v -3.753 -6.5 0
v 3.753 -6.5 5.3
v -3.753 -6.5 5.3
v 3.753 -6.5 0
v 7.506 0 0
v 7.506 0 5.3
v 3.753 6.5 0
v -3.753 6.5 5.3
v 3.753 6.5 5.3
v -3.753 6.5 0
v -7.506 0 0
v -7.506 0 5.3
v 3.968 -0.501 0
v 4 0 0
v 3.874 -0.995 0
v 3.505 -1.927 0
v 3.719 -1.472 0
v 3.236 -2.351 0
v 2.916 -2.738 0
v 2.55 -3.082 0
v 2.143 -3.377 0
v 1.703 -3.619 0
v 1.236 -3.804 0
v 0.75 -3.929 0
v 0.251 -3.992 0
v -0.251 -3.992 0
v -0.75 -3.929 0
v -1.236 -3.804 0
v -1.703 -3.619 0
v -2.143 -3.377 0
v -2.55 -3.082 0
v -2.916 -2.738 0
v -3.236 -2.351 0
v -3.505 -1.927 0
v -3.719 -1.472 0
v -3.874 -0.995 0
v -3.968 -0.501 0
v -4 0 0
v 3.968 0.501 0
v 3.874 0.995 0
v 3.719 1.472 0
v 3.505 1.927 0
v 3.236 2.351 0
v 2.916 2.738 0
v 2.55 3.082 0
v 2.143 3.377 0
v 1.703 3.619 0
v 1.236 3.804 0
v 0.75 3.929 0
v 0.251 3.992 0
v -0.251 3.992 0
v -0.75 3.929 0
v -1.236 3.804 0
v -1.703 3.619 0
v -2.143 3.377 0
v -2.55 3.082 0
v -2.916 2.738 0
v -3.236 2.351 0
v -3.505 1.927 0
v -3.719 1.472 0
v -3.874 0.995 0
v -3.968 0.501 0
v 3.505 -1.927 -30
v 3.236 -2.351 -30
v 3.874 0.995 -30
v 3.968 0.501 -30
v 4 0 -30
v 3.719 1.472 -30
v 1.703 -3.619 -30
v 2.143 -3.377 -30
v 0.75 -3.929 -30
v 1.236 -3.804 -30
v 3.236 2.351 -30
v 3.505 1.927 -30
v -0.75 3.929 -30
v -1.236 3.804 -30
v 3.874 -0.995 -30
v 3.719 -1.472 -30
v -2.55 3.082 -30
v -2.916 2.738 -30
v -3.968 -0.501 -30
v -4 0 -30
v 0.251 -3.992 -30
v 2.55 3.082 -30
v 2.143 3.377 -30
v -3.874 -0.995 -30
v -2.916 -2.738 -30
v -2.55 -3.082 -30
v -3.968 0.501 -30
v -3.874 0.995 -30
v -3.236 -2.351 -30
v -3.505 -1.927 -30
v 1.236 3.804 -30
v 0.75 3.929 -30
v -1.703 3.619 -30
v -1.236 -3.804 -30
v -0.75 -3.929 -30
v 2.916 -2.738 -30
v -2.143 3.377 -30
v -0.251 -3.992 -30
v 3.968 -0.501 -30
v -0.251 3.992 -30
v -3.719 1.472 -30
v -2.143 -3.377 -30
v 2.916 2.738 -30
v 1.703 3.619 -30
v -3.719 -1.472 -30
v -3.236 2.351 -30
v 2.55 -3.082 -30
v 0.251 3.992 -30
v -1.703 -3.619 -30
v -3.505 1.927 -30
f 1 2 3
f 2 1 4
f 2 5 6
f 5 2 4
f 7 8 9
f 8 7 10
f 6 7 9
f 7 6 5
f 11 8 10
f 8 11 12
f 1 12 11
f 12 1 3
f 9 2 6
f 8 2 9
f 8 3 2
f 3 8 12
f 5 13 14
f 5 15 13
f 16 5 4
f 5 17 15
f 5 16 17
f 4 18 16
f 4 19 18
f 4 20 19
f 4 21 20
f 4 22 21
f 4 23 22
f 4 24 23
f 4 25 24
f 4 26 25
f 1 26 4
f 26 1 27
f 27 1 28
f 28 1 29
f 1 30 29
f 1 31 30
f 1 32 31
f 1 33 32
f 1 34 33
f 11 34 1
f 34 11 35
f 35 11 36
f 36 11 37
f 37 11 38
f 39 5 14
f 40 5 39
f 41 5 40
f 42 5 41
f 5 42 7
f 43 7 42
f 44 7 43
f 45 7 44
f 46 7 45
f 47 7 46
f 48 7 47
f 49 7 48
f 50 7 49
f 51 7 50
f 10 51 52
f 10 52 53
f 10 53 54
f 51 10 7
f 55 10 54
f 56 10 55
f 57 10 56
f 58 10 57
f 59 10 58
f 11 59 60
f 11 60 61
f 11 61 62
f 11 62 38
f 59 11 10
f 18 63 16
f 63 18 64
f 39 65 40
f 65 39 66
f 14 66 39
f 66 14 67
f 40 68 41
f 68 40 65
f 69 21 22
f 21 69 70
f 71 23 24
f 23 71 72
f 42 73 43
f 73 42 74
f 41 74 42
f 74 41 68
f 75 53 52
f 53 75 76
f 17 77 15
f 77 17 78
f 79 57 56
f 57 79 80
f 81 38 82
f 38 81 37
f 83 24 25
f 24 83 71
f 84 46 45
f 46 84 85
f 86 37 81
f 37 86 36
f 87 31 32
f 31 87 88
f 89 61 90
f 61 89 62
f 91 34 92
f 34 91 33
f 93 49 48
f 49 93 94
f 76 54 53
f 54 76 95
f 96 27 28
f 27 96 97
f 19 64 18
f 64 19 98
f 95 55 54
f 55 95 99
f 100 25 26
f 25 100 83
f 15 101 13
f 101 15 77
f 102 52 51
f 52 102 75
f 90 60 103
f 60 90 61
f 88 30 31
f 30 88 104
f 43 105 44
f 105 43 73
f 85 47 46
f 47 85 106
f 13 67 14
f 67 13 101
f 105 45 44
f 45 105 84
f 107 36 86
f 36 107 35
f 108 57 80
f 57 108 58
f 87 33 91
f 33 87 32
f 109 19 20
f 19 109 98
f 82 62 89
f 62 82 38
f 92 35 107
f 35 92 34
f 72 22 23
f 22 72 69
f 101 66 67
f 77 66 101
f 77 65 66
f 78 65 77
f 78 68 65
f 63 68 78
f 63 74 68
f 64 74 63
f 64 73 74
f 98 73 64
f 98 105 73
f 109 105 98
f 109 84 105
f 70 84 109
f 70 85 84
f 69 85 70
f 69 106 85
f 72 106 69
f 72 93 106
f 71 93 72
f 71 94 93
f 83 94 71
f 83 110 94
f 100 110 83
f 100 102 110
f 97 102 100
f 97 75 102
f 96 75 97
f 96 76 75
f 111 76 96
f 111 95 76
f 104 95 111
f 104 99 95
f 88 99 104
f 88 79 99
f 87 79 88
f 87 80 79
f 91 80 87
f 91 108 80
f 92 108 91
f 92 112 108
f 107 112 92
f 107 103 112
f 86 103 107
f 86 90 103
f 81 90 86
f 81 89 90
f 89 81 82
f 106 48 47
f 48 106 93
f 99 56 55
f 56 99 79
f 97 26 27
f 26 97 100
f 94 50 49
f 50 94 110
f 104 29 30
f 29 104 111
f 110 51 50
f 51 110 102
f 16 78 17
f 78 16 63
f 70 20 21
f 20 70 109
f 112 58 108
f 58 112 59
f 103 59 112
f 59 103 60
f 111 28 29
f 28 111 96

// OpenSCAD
// M8 Hex Bolt (corrected)

// Dimensions
head_af = 13;      // Across-flats (二面幅)
head_height = 5.3;
shank_dia = 8;
shank_len = 30;

// cylinder(..., $fn=6) を使用する場合、radius は「外接円の半径」を指定する必要があります。
// 対辺距離(head_af)の六角形において、外接円の半径 r は head_af / sqrt(3) です。
hex_radius = head_af / sqrt(3);

union() {
    // 頭部の底面を z=0 に配置
    cylinder(r = hex_radius, h = head_height, $fn = 6);
    
    // シャンクを z<0 側に配置
    translate([0, 0, -shank_len])
        cylinder(d = shank_dia, h = shank_len, $fn = 50);
}
